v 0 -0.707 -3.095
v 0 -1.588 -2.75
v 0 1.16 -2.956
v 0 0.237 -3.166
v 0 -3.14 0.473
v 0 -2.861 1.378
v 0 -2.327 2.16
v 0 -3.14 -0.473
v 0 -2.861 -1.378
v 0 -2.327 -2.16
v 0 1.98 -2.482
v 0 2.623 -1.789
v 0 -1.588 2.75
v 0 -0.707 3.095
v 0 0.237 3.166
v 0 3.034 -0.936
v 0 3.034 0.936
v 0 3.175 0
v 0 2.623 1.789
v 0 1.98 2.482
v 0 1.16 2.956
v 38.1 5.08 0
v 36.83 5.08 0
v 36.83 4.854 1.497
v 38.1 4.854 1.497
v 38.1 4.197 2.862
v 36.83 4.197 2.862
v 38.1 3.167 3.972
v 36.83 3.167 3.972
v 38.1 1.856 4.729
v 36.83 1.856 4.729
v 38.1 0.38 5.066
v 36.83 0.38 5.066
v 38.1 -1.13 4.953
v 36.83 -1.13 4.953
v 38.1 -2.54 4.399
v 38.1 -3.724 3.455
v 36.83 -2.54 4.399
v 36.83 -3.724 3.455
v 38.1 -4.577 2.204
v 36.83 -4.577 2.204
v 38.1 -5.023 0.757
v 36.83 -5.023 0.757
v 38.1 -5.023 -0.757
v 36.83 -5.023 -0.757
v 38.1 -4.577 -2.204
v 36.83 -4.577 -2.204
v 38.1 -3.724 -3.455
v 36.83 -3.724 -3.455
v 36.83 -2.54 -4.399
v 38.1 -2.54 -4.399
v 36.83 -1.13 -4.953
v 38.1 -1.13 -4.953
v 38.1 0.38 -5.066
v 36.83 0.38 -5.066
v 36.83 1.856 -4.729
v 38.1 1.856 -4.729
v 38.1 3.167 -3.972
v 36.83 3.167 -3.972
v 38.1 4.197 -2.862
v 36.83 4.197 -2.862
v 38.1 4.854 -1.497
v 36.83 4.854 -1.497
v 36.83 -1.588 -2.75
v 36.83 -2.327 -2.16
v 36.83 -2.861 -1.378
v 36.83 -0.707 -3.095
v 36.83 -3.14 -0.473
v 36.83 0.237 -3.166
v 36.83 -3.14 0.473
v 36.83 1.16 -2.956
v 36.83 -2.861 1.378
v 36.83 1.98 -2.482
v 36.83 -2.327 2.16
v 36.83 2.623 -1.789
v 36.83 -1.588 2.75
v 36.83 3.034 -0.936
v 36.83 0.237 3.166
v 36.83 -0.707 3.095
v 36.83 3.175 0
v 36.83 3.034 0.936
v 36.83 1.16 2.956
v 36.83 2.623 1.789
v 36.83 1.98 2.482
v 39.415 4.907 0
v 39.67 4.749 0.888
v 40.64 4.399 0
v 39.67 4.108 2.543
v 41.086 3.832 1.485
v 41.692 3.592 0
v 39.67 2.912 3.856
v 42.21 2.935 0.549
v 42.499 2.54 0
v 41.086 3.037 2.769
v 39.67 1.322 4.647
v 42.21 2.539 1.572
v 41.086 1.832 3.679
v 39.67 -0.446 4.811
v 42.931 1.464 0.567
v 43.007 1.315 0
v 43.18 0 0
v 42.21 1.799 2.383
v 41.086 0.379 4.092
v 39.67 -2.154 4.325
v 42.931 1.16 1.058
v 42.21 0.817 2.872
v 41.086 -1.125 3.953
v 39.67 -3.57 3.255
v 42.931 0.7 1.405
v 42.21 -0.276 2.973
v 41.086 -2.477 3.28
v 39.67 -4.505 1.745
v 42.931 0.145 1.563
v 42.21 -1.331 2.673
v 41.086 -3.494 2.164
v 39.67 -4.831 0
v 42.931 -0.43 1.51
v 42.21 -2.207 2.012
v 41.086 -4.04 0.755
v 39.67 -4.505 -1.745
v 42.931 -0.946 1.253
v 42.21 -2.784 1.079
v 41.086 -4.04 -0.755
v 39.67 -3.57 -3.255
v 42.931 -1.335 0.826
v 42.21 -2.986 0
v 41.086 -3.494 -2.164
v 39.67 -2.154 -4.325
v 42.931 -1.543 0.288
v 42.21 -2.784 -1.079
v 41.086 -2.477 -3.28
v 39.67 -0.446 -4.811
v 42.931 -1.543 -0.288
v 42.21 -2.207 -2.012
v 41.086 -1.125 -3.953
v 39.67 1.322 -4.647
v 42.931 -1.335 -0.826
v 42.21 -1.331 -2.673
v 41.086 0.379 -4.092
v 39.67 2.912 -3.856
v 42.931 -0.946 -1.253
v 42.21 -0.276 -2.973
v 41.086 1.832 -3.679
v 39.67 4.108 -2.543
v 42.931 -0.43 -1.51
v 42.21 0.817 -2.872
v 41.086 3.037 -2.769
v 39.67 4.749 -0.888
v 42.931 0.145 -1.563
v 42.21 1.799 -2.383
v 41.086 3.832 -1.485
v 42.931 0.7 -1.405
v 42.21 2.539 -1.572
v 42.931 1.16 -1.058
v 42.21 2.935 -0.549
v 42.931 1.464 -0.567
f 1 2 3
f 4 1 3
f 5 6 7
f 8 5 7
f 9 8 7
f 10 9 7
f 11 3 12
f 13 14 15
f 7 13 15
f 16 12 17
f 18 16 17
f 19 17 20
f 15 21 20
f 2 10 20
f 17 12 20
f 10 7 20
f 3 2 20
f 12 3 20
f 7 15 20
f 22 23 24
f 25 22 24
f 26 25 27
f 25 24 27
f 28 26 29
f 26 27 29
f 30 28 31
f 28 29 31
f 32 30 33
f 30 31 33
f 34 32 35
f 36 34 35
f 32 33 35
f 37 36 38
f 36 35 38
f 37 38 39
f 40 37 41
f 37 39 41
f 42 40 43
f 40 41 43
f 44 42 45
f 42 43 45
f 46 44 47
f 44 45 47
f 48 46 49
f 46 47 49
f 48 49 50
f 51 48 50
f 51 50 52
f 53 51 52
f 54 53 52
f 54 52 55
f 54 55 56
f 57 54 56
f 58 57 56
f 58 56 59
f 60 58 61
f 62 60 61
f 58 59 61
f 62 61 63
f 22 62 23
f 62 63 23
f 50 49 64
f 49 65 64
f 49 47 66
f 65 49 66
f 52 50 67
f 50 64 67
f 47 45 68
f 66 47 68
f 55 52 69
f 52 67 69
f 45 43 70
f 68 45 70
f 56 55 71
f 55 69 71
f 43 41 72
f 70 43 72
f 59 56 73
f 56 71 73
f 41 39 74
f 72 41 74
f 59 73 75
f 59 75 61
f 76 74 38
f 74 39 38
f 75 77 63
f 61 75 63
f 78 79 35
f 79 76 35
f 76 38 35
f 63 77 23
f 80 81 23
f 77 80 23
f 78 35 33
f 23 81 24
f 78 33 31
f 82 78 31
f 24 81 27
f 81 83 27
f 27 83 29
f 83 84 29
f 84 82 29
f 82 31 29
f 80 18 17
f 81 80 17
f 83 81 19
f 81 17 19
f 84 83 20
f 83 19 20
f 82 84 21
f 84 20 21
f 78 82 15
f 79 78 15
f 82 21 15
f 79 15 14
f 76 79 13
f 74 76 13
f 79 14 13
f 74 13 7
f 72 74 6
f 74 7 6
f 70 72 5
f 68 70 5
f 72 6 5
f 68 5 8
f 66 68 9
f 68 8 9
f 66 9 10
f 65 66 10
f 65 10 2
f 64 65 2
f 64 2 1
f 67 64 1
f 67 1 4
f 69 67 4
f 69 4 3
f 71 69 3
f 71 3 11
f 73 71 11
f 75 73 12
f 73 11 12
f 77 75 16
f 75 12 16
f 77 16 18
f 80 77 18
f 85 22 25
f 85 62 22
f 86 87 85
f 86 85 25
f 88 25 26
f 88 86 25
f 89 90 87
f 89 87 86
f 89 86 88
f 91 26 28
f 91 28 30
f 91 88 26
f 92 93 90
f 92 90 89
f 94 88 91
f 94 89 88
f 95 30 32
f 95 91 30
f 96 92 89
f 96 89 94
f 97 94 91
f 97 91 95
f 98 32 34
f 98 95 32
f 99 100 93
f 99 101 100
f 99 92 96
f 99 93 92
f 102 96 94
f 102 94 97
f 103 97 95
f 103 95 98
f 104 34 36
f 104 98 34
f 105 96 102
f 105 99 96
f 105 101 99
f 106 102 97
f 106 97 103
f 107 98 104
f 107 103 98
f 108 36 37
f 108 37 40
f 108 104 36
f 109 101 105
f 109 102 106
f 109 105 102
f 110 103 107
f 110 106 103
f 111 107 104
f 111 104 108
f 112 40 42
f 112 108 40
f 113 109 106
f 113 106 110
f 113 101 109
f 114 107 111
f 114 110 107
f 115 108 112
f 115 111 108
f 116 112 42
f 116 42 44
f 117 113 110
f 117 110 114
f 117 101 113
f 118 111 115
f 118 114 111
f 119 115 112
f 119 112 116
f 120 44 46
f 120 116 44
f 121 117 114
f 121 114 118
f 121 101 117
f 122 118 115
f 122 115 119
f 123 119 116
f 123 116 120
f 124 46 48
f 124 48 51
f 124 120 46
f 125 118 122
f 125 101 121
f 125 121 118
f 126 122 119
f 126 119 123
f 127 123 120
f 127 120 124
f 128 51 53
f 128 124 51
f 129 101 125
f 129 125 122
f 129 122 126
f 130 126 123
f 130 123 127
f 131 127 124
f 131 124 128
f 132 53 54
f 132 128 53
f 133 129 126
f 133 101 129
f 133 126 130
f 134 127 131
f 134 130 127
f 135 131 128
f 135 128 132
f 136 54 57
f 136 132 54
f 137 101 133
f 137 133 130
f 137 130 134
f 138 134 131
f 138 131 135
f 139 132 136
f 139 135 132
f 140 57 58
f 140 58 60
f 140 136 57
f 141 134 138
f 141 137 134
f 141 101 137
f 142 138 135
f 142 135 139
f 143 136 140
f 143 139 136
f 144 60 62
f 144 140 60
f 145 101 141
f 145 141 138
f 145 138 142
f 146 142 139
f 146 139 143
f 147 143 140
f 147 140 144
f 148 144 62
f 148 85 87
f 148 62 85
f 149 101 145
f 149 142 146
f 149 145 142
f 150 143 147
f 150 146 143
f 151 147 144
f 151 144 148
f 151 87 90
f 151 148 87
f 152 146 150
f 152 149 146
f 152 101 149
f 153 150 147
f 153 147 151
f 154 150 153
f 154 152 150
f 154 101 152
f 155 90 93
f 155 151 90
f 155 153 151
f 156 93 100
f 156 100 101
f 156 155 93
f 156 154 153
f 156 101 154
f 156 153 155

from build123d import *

# Parameters (mm, degrees)
F0_R     = 3.175
F1_DEPTH = 36.83
F2_R     = 5.08
F3_DEPTH = 6.35
F4_R     = 5.08


with BuildPart() as f1:
    # F0 (on Right) → F1 (new body)
    with BuildSketch(Plane.YZ):
        Circle(F0_R)
    extrude(amount=F1_DEPTH)

    # F2 (on face) → F3 (join)
    with BuildSketch(Plane.YZ.offset(36.83)):
        Circle(F2_R)
    extrude(amount=F3_DEPTH)

    # F4
    f4_edges = [f1.edges().sort_by_distance(p)[0] for p in [
        (43.18, -5.08, 0),
    ]]
    fillet(f4_edges, radius=F4_R)


solid = f1.part
